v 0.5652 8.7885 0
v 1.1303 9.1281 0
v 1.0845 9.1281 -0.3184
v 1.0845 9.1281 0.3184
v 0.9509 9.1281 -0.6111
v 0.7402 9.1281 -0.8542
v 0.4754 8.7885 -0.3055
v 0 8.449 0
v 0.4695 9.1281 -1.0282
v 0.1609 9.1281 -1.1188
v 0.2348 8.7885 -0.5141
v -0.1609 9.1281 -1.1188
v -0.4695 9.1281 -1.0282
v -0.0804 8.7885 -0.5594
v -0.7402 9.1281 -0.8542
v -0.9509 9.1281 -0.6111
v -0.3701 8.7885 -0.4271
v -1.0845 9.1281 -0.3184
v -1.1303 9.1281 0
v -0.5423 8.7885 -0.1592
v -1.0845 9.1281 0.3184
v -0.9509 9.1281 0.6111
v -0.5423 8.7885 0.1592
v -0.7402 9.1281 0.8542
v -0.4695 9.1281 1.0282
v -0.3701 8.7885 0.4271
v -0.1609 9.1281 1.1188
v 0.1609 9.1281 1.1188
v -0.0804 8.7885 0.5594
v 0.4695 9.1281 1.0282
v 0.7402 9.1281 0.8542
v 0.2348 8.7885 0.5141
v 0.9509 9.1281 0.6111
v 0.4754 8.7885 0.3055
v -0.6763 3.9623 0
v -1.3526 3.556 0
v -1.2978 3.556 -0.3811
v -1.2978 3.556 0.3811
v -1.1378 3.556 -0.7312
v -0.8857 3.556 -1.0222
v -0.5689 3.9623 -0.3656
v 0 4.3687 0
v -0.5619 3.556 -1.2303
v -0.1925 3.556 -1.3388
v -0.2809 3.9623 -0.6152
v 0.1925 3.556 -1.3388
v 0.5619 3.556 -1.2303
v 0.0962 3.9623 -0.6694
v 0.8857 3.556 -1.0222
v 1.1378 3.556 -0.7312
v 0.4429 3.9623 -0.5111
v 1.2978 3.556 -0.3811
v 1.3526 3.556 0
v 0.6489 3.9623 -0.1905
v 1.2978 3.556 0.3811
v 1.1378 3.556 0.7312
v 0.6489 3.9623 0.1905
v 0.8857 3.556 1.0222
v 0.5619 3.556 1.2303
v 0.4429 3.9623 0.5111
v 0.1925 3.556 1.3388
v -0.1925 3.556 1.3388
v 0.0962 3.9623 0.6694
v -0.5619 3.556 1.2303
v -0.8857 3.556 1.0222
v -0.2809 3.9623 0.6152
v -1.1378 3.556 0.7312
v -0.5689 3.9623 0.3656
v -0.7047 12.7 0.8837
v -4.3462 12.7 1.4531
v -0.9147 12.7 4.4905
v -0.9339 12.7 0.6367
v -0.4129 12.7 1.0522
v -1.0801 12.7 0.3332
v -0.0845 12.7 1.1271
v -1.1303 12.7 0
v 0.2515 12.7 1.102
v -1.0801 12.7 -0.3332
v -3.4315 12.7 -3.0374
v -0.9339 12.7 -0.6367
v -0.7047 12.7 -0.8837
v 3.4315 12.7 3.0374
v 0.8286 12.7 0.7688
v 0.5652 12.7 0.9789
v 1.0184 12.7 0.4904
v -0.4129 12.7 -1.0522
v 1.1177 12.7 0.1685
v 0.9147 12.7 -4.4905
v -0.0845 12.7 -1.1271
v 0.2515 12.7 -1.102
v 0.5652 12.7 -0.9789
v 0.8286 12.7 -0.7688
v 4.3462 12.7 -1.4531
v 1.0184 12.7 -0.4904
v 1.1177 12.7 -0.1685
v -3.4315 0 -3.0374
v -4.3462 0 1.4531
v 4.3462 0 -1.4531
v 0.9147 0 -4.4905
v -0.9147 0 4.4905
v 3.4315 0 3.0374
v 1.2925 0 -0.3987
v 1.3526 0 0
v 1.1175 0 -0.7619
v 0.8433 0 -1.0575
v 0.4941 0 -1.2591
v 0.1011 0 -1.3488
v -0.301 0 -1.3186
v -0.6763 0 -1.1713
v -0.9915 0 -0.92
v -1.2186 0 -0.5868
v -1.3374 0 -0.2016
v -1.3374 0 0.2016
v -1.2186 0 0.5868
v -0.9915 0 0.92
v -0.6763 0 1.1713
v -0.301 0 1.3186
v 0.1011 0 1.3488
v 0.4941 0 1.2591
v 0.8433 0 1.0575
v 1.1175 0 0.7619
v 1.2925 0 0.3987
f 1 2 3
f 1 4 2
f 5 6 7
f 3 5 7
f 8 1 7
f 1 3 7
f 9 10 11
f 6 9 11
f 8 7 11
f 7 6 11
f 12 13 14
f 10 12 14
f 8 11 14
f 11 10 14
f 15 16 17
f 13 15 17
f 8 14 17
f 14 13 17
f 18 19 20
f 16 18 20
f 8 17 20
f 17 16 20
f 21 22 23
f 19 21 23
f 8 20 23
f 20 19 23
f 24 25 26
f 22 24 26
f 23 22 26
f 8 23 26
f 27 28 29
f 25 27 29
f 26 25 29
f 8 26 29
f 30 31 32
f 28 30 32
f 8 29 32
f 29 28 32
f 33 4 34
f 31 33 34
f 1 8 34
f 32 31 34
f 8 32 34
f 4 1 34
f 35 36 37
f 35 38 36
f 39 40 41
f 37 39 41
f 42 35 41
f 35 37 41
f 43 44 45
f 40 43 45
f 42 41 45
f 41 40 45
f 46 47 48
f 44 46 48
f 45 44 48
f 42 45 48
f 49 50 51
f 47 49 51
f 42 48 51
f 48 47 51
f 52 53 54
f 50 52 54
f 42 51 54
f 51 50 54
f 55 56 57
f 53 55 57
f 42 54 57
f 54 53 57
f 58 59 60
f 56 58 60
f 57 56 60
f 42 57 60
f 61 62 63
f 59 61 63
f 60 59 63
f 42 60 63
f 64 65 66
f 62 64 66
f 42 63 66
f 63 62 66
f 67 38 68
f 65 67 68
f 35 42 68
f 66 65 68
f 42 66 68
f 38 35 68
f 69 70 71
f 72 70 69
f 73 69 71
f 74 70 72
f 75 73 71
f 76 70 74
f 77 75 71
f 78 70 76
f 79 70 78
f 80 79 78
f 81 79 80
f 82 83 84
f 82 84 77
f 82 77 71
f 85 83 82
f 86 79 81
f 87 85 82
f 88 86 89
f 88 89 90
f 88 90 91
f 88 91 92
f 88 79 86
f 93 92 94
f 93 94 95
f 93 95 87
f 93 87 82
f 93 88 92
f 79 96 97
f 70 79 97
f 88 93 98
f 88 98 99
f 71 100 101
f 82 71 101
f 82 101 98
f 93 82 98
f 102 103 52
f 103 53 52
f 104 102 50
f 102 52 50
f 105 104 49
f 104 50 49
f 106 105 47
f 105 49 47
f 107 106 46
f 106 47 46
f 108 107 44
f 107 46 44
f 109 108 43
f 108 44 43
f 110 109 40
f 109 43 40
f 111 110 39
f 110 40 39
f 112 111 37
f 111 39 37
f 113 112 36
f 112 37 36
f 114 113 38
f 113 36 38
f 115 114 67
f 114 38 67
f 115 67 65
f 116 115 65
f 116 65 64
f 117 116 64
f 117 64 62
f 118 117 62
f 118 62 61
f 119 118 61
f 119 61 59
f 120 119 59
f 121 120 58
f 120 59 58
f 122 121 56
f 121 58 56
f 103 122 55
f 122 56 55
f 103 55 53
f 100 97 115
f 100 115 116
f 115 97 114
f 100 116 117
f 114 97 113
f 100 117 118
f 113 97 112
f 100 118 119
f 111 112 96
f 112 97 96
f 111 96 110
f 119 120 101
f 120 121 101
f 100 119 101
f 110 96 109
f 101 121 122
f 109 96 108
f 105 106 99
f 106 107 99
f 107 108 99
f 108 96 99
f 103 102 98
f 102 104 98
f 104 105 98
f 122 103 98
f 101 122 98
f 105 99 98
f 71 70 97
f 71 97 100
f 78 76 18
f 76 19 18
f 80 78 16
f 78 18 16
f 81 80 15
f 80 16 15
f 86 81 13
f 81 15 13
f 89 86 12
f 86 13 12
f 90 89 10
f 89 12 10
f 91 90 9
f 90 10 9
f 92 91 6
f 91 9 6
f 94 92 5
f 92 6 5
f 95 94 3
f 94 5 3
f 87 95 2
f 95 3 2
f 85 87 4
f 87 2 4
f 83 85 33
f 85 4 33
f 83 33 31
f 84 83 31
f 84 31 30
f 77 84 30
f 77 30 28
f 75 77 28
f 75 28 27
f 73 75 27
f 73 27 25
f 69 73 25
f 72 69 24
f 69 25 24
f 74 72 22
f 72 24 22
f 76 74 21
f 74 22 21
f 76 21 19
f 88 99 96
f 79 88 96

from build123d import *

# Parameters (mm, degrees)
BOSS_EXTRUDE1_DEPTH       = 12.7
F_4_40_TAPPED_HOLE1_D     = 2.2606
F_4_40_TAPPED_HOLE1_DEPTH = 3.571875
F_4_40_TAPPED_HOLE1_TIP   = 0.679152758
F_6_32_TAPPED_HOLE1_D     = 2.7051
F_6_32_TAPPED_HOLE1_DEPTH = 3.556
F_6_32_TAPPED_HOLE1_TIP   = 0.81269403


with BuildPart() as part:
    # Sketch1 → Boss-Extrude1 (new body)
    with BuildSketch(Plane(origin=(0, 0, 0), x_dir=(1, 0, 0), z_dir=(0, 1, 0))):
        Polygon((3.431522356, -3.037425951), (4.346249213, 1.453072558), (0.914726858, 4.490498509), (-3.431522356, 3.037425951), (-4.346249213, -1.453072558), (-0.914726858, -4.490498509), align=None)
    extrude(amount=BOSS_EXTRUDE1_DEPTH)

    # #4-40 Tapped Hole1
    with Locations(Plane(origin=(0, 12.7, 0), x_dir=(1, 0, 0), z_dir=(0, 1, 0))):
        with Locations((0, 0)):
            Hole(F_4_40_TAPPED_HOLE1_D / 2, depth=F_4_40_TAPPED_HOLE1_DEPTH)
            with Locations((0, 0, -(F_4_40_TAPPED_HOLE1_DEPTH + F_4_40_TAPPED_HOLE1_TIP / 2))):  # 118° drill point
                Cone(0, F_4_40_TAPPED_HOLE1_D / 2, F_4_40_TAPPED_HOLE1_TIP, mode=Mode.SUBTRACT)

    # #6-32 Tapped Hole1
    with Locations(Plane(origin=(0, 0, 0), x_dir=(-1, 0, 0), z_dir=(0, -1, 0))):
        with Locations((0, 0)):
            Hole(F_6_32_TAPPED_HOLE1_D / 2, depth=F_6_32_TAPPED_HOLE1_DEPTH)
            with Locations((0, 0, -(F_6_32_TAPPED_HOLE1_DEPTH + F_6_32_TAPPED_HOLE1_TIP / 2))):  # 118° drill point
                Cone(0, F_6_32_TAPPED_HOLE1_D / 2, F_6_32_TAPPED_HOLE1_TIP, mode=Mode.SUBTRACT)


solid = part.part
